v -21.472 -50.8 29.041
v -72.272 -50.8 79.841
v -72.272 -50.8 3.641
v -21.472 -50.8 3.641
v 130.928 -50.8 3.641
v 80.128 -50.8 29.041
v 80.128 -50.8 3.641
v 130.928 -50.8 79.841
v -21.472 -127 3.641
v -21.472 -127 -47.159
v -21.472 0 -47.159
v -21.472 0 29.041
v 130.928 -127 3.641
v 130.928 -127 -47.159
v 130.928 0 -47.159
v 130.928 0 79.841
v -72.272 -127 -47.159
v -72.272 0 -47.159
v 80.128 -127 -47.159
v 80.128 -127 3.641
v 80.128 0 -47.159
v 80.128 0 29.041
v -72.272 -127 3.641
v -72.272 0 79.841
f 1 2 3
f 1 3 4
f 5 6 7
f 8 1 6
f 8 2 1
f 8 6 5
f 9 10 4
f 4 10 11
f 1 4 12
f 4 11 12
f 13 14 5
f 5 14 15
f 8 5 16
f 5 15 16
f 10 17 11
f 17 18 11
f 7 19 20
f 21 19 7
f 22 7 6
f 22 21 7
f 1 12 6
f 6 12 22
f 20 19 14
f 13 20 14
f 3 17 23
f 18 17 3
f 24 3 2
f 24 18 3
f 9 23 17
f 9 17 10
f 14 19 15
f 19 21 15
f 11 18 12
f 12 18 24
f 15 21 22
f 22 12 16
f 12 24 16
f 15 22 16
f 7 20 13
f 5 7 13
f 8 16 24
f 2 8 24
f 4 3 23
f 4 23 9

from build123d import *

# Parameters (mm, degrees)
F1_DEPTH = 50.8
F2_W     = 50.8
F2_H     = 50.8
F3_DEPTH = 76.2
F4_W     = 50.8
F4_H     = 50.8
F5_DEPTH = 76.2


with BuildPart() as f1:
    # F0 (on Front) → F1 (new body)
    with BuildSketch(Plane.XZ):
        Polygon((-72.271809, 79.84082), (-72.271809, -47.15918), (-21.471809, -47.15918), (-21.471809, 29.04082), (80.128191, 29.04082), (80.128191, -47.15918), (130.928191, -47.15918), (130.928191, 79.84082), align=None)
    extrude(amount=F1_DEPTH)

    # F2 (on face) → F3 (join)
    with BuildSketch(Plane.XZ.offset(50.8)):
        with Locations((-46.871809, -21.75918)):
            Rectangle(F2_W, F2_H)
    extrude(amount=F3_DEPTH)

    # F4 (on face) → F5 (join)
    with BuildSketch(Plane.XZ.offset(50.8)):
        with Locations((105.528191, -21.75918)):
            Rectangle(F4_W, F4_H)
    extrude(amount=F5_DEPTH)


solid = f1.part
